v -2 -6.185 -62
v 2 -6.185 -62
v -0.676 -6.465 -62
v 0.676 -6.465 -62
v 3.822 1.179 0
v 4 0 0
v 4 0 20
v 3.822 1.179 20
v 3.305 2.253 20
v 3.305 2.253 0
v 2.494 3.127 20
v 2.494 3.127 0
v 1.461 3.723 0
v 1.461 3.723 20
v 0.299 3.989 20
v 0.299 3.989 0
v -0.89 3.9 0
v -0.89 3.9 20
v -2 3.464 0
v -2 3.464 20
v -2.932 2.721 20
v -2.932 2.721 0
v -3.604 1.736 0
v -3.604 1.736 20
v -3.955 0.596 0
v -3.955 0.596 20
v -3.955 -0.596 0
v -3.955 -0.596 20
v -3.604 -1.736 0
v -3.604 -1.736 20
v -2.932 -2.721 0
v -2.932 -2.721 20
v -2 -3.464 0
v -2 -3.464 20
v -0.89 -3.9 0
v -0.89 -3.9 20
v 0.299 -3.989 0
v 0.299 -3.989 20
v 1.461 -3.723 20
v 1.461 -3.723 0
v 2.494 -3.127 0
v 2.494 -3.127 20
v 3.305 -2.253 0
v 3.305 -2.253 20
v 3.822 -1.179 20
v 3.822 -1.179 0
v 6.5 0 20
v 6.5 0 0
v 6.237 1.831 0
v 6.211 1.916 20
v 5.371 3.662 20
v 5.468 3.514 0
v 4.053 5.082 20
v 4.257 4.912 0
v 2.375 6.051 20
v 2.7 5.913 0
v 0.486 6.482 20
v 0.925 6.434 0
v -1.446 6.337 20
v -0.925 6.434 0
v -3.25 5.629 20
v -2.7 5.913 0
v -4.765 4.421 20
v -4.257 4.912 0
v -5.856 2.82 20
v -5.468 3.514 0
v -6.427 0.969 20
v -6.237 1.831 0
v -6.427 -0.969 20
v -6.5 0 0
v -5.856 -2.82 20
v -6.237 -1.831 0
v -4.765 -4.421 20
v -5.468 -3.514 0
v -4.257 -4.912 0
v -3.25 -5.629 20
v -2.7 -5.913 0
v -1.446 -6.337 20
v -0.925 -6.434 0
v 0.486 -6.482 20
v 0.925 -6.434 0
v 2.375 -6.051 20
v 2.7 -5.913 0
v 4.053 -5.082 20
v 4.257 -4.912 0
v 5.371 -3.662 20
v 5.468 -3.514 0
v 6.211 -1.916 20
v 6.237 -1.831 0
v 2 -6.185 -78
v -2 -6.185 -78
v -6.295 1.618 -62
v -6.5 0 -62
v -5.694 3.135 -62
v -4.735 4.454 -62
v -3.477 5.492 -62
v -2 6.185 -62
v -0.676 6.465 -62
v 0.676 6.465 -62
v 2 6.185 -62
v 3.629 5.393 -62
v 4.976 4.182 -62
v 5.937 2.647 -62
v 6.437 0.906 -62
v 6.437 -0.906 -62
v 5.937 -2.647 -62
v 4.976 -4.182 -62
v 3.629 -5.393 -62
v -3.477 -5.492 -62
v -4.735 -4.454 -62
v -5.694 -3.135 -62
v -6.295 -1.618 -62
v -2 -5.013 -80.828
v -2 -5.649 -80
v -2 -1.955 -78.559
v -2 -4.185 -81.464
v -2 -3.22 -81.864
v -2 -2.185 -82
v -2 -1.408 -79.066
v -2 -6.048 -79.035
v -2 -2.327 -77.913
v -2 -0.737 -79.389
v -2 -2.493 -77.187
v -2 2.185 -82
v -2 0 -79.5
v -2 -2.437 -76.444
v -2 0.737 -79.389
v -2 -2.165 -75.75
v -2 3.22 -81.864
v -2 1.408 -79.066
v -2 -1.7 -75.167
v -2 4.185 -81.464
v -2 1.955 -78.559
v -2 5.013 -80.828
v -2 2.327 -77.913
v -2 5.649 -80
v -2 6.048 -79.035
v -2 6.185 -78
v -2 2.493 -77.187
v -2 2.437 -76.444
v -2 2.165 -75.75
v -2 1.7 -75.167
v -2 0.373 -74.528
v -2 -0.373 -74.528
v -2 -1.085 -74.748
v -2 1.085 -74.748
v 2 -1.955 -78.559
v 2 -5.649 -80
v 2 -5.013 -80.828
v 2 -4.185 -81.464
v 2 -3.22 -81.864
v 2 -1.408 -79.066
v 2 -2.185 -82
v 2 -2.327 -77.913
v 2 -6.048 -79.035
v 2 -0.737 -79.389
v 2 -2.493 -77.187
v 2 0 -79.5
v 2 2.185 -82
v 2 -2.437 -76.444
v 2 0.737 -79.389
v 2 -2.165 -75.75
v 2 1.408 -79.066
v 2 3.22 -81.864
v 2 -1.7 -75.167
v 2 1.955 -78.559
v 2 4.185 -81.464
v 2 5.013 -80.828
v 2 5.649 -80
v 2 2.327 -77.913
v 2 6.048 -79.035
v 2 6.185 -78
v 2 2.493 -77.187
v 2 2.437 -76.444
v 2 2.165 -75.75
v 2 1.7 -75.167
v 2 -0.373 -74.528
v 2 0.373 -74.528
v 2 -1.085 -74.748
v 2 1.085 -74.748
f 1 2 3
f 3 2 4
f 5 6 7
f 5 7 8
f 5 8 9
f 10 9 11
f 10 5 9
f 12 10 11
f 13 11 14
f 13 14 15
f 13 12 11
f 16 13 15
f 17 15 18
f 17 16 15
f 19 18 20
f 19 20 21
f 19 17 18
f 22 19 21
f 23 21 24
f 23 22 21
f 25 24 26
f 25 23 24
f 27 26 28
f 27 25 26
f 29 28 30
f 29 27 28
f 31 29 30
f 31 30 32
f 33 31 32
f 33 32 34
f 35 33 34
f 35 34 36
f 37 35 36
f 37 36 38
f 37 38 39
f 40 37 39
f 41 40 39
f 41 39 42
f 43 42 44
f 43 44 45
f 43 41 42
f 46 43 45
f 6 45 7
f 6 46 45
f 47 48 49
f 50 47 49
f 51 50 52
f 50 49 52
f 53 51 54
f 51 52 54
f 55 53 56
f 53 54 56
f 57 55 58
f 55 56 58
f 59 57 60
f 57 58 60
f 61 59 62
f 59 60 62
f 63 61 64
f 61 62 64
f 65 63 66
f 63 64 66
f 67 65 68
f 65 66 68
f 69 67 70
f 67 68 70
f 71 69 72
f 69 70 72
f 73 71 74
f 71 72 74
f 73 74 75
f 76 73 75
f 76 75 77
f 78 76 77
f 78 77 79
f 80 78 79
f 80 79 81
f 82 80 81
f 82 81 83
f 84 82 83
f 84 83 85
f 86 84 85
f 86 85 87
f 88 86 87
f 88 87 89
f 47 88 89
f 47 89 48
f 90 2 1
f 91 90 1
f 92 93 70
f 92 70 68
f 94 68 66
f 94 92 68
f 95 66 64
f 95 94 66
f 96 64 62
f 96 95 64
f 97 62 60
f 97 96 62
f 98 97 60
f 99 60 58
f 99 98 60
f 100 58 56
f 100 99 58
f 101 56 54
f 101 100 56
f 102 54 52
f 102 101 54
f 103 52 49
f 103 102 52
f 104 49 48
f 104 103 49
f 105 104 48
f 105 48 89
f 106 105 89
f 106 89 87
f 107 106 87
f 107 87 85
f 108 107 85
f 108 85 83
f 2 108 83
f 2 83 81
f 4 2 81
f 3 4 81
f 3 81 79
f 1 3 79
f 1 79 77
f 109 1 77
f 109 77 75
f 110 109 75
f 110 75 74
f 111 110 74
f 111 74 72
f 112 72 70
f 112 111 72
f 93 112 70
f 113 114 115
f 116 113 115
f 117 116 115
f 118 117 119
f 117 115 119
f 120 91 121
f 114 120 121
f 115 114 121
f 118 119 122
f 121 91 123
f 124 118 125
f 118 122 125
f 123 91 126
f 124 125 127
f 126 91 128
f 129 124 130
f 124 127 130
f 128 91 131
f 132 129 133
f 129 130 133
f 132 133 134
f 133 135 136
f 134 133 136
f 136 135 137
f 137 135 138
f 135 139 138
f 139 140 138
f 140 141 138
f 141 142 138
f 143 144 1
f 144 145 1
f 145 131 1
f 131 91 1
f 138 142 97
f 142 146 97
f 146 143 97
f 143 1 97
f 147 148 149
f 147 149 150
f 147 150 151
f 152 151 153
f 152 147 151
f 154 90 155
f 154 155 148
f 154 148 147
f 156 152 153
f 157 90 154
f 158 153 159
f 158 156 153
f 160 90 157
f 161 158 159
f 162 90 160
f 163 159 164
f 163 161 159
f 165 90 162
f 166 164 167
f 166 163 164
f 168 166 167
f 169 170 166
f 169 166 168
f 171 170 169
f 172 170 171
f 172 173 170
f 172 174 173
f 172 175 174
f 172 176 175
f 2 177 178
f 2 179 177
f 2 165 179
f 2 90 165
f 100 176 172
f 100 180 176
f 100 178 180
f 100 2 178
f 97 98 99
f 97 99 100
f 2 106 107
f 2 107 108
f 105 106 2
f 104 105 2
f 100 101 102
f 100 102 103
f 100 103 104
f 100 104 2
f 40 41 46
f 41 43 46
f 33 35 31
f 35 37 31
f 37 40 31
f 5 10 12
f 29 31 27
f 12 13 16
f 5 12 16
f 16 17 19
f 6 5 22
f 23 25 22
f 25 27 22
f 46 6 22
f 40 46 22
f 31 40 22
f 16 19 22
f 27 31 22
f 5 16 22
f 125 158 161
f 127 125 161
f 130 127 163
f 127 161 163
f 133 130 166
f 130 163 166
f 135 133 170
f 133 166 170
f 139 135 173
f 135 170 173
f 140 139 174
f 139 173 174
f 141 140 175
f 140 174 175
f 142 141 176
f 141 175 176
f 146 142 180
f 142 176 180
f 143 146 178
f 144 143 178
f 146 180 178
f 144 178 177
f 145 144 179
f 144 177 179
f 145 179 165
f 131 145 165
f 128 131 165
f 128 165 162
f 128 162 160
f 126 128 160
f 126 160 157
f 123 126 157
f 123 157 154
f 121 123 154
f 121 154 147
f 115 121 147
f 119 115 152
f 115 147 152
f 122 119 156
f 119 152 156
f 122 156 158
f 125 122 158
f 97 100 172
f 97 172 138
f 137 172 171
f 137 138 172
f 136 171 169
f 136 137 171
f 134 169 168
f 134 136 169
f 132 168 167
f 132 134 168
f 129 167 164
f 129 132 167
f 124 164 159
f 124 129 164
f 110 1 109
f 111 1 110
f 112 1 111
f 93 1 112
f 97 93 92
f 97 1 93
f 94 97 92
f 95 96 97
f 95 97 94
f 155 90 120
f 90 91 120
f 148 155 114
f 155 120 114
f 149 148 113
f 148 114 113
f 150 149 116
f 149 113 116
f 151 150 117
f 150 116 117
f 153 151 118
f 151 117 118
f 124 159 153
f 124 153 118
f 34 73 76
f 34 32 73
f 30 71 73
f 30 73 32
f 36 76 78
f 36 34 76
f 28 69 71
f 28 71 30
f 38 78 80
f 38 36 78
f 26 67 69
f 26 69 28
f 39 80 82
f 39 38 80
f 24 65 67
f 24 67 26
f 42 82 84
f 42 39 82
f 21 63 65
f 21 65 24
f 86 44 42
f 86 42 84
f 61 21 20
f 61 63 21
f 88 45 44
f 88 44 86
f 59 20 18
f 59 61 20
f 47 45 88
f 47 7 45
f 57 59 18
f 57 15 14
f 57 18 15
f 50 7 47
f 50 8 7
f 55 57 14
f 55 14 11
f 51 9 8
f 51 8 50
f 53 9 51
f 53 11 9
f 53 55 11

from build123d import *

# Parameters (mm, degrees)
SKETCH1_R           = 6.5
SKETCH1_R_2         = 4
BOSS_EXTRUDE1_DEPTH = 20
BOSS_EXTRUDE2_START = 62
SKETCH2_R           = 6.5
BOSS_EXTRUDE2_DEPTH = 62
SKETCH3_W           = 4
SKETCH3_H           = 12.369316876
BOSS_EXTRUDE3_DEPTH = 20
FILLET1_R           = 4
SKETCH4_R           = 2.5
CUT_EXTRUDE1_DEPTH  = 4


with BuildPart() as part:
    # Sketch1 → Boss-Extrude1 (new body)
    with BuildSketch(Plane.XY):
        Circle(SKETCH1_R)
        Circle(SKETCH1_R_2, mode=Mode.SUBTRACT)
    extrude(amount=BOSS_EXTRUDE1_DEPTH)

    # Sketch2 → Boss-Extrude2 (add)
    with BuildSketch(Plane(origin=(0, 0, 0), x_dir=(-1, 0, 0), z_dir=(0, 0, -1)).offset(BOSS_EXTRUDE2_START)):
        Circle(SKETCH2_R)
    extrude(amount=-BOSS_EXTRUDE2_DEPTH)

    # Sketch3 → Boss-Extrude3 (add)
    with BuildSketch(Plane(origin=(0, 0, -62), x_dir=(-1, 0, 0), z_dir=(0, 0, -1))):
        Rectangle(SKETCH3_W, SKETCH3_H)
    extrude(amount=BOSS_EXTRUDE3_DEPTH)

    # Fillet1
    fillet1_edges = [part.edges().sort_by_distance(p)[0] for p in [
        (0, 6.184658438, -82),
        (0, -6.184658438, -82),
    ]]
    fillet(fillet1_edges, radius=FILLET1_R)

    # Sketch4 → Cut-Extrude1 (cut)
    with BuildSketch(Plane(origin=(2, 0, 0), x_dir=(0, 0, -1), z_dir=(1, 0, 0))):
        with Locations((77, 0)):
            Circle(SKETCH4_R)
    extrude(amount=-CUT_EXTRUDE1_DEPTH, mode=Mode.SUBTRACT)


solid = part.part
